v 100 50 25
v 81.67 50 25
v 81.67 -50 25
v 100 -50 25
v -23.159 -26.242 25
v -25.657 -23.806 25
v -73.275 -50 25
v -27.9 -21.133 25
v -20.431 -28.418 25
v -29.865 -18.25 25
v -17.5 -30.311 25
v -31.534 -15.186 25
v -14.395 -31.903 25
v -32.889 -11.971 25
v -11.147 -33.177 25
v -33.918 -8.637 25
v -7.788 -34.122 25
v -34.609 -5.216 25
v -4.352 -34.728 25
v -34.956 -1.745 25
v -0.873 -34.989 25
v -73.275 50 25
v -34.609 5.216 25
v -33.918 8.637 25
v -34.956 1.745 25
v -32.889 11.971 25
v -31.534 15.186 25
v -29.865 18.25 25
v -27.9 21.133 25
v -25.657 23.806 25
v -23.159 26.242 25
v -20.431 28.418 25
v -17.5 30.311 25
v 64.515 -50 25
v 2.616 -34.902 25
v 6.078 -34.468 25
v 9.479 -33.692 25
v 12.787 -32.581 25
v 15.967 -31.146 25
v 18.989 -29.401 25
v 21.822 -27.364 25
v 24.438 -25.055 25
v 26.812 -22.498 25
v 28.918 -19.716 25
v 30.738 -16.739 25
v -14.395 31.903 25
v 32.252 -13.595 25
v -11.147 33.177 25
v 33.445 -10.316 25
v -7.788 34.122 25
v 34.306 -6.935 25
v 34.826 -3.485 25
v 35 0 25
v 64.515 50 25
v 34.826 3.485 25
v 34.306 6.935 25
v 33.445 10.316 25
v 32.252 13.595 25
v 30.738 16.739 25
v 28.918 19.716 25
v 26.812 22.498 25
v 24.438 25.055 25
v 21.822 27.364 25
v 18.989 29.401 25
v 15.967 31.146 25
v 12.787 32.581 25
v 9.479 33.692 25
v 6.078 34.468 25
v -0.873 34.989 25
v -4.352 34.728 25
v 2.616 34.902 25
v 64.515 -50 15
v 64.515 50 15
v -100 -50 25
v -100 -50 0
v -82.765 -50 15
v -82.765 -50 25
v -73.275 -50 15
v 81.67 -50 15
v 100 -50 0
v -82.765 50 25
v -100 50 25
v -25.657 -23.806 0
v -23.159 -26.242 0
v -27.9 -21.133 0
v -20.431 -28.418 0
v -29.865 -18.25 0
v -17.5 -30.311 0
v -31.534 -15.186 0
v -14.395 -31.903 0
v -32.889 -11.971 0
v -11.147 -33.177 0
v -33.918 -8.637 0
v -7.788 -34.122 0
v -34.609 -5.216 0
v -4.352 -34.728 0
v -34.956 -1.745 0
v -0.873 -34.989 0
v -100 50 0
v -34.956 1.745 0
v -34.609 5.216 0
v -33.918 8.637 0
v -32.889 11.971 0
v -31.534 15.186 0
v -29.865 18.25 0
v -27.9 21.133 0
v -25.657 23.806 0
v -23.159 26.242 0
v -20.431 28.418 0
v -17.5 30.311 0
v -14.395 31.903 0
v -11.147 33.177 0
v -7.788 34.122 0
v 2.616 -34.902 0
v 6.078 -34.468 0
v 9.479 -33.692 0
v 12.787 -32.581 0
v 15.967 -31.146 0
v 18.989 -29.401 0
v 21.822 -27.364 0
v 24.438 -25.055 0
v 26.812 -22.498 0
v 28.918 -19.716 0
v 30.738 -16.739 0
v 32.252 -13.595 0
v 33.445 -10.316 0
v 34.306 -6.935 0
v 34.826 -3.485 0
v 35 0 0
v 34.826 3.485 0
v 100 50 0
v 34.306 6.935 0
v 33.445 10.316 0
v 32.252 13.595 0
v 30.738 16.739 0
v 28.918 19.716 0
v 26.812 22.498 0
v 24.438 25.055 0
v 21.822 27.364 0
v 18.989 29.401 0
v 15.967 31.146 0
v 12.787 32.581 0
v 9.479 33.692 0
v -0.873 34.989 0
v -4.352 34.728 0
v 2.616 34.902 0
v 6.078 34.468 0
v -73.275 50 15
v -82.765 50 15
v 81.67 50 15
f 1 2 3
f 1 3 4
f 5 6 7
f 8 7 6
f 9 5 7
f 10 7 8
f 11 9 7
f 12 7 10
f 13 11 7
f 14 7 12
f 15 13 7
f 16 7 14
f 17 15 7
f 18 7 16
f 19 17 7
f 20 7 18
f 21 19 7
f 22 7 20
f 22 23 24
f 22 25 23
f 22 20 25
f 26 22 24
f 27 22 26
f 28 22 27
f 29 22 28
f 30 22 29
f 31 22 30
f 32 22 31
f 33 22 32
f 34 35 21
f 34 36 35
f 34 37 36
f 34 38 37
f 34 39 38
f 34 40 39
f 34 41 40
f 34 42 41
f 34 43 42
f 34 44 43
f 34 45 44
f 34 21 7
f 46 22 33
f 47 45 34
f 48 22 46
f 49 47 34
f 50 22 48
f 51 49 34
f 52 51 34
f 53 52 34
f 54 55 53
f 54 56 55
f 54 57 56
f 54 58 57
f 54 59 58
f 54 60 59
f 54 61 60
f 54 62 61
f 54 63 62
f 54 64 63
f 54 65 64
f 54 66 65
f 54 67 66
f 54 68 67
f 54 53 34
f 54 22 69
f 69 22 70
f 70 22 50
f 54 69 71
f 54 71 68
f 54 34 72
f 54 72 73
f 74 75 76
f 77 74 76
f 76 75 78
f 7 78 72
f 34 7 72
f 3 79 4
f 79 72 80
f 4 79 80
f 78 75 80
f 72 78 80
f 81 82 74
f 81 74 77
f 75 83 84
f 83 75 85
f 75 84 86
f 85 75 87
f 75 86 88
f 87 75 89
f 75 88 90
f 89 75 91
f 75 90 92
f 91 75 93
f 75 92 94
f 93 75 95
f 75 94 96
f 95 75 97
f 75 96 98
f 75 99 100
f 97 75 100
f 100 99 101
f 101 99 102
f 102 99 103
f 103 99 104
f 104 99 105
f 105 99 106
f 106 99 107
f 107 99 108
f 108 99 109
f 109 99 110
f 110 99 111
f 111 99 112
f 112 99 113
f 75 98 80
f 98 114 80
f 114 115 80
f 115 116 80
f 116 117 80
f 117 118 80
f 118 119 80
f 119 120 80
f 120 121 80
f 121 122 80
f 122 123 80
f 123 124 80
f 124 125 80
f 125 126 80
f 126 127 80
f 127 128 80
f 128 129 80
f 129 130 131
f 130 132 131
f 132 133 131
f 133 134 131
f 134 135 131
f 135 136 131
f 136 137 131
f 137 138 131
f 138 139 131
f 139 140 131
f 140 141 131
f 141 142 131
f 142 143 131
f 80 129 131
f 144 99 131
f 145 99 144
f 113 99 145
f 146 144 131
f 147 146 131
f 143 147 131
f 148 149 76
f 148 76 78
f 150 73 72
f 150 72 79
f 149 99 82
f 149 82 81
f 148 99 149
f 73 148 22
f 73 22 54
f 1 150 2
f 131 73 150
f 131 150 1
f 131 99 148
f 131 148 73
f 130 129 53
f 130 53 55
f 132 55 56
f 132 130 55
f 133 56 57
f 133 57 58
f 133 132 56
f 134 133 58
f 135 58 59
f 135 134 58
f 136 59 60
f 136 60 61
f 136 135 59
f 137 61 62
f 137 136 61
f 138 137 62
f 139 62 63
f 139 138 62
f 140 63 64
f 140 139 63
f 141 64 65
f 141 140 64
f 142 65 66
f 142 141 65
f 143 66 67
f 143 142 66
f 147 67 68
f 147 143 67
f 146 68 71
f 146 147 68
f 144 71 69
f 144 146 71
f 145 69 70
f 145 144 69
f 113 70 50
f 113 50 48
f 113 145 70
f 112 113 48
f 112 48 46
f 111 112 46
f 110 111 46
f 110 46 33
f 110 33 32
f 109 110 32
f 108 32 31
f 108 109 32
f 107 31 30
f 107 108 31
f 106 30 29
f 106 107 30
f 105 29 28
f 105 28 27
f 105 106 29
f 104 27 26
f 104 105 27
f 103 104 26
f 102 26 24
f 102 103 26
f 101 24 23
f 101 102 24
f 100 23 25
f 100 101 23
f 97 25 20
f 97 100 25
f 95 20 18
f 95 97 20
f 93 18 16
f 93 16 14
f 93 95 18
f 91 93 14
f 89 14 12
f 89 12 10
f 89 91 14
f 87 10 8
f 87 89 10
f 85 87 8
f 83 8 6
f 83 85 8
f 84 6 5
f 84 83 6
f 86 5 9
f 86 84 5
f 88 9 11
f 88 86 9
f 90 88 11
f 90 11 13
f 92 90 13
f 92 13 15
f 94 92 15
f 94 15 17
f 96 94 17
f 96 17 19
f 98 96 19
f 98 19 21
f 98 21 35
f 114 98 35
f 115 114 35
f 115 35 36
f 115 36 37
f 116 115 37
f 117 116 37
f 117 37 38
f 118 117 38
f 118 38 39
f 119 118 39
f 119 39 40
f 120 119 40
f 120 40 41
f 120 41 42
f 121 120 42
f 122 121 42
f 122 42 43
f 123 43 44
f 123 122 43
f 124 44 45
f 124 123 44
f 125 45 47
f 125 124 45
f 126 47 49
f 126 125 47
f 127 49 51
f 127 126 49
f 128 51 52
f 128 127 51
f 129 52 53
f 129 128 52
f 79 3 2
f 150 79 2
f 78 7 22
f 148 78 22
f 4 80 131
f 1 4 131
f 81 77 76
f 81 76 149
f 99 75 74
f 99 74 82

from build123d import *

# Parameters (mm, degrees)
F0_W     = 200
F0_H     = 100
F0_R     = 35
F1_DEPTH = 25
F2_W     = 9.490147
F2_H     = 100
F2_W_2   = 17.155282
F3_DEPTH = 10


with BuildPart() as f1:
    # F0 (on Top) → F1 (new body)
    with BuildSketch(Plane.XY):
        Rectangle(F0_W, F0_H)
        Circle(F0_R, mode=Mode.SUBTRACT)
    extrude(amount=F1_DEPTH)

    # F2 (on face) → F3 (cut)
    with BuildSketch(Plane.XY.offset(25)):
        with Locations((-78.019992, 0)):
            Rectangle(F2_W, F2_H)
        with Locations((73.092412, 0)):
            Rectangle(F2_W_2, F2_H)
    extrude(amount=-F3_DEPTH, mode=Mode.SUBTRACT)


solid = f1.part
